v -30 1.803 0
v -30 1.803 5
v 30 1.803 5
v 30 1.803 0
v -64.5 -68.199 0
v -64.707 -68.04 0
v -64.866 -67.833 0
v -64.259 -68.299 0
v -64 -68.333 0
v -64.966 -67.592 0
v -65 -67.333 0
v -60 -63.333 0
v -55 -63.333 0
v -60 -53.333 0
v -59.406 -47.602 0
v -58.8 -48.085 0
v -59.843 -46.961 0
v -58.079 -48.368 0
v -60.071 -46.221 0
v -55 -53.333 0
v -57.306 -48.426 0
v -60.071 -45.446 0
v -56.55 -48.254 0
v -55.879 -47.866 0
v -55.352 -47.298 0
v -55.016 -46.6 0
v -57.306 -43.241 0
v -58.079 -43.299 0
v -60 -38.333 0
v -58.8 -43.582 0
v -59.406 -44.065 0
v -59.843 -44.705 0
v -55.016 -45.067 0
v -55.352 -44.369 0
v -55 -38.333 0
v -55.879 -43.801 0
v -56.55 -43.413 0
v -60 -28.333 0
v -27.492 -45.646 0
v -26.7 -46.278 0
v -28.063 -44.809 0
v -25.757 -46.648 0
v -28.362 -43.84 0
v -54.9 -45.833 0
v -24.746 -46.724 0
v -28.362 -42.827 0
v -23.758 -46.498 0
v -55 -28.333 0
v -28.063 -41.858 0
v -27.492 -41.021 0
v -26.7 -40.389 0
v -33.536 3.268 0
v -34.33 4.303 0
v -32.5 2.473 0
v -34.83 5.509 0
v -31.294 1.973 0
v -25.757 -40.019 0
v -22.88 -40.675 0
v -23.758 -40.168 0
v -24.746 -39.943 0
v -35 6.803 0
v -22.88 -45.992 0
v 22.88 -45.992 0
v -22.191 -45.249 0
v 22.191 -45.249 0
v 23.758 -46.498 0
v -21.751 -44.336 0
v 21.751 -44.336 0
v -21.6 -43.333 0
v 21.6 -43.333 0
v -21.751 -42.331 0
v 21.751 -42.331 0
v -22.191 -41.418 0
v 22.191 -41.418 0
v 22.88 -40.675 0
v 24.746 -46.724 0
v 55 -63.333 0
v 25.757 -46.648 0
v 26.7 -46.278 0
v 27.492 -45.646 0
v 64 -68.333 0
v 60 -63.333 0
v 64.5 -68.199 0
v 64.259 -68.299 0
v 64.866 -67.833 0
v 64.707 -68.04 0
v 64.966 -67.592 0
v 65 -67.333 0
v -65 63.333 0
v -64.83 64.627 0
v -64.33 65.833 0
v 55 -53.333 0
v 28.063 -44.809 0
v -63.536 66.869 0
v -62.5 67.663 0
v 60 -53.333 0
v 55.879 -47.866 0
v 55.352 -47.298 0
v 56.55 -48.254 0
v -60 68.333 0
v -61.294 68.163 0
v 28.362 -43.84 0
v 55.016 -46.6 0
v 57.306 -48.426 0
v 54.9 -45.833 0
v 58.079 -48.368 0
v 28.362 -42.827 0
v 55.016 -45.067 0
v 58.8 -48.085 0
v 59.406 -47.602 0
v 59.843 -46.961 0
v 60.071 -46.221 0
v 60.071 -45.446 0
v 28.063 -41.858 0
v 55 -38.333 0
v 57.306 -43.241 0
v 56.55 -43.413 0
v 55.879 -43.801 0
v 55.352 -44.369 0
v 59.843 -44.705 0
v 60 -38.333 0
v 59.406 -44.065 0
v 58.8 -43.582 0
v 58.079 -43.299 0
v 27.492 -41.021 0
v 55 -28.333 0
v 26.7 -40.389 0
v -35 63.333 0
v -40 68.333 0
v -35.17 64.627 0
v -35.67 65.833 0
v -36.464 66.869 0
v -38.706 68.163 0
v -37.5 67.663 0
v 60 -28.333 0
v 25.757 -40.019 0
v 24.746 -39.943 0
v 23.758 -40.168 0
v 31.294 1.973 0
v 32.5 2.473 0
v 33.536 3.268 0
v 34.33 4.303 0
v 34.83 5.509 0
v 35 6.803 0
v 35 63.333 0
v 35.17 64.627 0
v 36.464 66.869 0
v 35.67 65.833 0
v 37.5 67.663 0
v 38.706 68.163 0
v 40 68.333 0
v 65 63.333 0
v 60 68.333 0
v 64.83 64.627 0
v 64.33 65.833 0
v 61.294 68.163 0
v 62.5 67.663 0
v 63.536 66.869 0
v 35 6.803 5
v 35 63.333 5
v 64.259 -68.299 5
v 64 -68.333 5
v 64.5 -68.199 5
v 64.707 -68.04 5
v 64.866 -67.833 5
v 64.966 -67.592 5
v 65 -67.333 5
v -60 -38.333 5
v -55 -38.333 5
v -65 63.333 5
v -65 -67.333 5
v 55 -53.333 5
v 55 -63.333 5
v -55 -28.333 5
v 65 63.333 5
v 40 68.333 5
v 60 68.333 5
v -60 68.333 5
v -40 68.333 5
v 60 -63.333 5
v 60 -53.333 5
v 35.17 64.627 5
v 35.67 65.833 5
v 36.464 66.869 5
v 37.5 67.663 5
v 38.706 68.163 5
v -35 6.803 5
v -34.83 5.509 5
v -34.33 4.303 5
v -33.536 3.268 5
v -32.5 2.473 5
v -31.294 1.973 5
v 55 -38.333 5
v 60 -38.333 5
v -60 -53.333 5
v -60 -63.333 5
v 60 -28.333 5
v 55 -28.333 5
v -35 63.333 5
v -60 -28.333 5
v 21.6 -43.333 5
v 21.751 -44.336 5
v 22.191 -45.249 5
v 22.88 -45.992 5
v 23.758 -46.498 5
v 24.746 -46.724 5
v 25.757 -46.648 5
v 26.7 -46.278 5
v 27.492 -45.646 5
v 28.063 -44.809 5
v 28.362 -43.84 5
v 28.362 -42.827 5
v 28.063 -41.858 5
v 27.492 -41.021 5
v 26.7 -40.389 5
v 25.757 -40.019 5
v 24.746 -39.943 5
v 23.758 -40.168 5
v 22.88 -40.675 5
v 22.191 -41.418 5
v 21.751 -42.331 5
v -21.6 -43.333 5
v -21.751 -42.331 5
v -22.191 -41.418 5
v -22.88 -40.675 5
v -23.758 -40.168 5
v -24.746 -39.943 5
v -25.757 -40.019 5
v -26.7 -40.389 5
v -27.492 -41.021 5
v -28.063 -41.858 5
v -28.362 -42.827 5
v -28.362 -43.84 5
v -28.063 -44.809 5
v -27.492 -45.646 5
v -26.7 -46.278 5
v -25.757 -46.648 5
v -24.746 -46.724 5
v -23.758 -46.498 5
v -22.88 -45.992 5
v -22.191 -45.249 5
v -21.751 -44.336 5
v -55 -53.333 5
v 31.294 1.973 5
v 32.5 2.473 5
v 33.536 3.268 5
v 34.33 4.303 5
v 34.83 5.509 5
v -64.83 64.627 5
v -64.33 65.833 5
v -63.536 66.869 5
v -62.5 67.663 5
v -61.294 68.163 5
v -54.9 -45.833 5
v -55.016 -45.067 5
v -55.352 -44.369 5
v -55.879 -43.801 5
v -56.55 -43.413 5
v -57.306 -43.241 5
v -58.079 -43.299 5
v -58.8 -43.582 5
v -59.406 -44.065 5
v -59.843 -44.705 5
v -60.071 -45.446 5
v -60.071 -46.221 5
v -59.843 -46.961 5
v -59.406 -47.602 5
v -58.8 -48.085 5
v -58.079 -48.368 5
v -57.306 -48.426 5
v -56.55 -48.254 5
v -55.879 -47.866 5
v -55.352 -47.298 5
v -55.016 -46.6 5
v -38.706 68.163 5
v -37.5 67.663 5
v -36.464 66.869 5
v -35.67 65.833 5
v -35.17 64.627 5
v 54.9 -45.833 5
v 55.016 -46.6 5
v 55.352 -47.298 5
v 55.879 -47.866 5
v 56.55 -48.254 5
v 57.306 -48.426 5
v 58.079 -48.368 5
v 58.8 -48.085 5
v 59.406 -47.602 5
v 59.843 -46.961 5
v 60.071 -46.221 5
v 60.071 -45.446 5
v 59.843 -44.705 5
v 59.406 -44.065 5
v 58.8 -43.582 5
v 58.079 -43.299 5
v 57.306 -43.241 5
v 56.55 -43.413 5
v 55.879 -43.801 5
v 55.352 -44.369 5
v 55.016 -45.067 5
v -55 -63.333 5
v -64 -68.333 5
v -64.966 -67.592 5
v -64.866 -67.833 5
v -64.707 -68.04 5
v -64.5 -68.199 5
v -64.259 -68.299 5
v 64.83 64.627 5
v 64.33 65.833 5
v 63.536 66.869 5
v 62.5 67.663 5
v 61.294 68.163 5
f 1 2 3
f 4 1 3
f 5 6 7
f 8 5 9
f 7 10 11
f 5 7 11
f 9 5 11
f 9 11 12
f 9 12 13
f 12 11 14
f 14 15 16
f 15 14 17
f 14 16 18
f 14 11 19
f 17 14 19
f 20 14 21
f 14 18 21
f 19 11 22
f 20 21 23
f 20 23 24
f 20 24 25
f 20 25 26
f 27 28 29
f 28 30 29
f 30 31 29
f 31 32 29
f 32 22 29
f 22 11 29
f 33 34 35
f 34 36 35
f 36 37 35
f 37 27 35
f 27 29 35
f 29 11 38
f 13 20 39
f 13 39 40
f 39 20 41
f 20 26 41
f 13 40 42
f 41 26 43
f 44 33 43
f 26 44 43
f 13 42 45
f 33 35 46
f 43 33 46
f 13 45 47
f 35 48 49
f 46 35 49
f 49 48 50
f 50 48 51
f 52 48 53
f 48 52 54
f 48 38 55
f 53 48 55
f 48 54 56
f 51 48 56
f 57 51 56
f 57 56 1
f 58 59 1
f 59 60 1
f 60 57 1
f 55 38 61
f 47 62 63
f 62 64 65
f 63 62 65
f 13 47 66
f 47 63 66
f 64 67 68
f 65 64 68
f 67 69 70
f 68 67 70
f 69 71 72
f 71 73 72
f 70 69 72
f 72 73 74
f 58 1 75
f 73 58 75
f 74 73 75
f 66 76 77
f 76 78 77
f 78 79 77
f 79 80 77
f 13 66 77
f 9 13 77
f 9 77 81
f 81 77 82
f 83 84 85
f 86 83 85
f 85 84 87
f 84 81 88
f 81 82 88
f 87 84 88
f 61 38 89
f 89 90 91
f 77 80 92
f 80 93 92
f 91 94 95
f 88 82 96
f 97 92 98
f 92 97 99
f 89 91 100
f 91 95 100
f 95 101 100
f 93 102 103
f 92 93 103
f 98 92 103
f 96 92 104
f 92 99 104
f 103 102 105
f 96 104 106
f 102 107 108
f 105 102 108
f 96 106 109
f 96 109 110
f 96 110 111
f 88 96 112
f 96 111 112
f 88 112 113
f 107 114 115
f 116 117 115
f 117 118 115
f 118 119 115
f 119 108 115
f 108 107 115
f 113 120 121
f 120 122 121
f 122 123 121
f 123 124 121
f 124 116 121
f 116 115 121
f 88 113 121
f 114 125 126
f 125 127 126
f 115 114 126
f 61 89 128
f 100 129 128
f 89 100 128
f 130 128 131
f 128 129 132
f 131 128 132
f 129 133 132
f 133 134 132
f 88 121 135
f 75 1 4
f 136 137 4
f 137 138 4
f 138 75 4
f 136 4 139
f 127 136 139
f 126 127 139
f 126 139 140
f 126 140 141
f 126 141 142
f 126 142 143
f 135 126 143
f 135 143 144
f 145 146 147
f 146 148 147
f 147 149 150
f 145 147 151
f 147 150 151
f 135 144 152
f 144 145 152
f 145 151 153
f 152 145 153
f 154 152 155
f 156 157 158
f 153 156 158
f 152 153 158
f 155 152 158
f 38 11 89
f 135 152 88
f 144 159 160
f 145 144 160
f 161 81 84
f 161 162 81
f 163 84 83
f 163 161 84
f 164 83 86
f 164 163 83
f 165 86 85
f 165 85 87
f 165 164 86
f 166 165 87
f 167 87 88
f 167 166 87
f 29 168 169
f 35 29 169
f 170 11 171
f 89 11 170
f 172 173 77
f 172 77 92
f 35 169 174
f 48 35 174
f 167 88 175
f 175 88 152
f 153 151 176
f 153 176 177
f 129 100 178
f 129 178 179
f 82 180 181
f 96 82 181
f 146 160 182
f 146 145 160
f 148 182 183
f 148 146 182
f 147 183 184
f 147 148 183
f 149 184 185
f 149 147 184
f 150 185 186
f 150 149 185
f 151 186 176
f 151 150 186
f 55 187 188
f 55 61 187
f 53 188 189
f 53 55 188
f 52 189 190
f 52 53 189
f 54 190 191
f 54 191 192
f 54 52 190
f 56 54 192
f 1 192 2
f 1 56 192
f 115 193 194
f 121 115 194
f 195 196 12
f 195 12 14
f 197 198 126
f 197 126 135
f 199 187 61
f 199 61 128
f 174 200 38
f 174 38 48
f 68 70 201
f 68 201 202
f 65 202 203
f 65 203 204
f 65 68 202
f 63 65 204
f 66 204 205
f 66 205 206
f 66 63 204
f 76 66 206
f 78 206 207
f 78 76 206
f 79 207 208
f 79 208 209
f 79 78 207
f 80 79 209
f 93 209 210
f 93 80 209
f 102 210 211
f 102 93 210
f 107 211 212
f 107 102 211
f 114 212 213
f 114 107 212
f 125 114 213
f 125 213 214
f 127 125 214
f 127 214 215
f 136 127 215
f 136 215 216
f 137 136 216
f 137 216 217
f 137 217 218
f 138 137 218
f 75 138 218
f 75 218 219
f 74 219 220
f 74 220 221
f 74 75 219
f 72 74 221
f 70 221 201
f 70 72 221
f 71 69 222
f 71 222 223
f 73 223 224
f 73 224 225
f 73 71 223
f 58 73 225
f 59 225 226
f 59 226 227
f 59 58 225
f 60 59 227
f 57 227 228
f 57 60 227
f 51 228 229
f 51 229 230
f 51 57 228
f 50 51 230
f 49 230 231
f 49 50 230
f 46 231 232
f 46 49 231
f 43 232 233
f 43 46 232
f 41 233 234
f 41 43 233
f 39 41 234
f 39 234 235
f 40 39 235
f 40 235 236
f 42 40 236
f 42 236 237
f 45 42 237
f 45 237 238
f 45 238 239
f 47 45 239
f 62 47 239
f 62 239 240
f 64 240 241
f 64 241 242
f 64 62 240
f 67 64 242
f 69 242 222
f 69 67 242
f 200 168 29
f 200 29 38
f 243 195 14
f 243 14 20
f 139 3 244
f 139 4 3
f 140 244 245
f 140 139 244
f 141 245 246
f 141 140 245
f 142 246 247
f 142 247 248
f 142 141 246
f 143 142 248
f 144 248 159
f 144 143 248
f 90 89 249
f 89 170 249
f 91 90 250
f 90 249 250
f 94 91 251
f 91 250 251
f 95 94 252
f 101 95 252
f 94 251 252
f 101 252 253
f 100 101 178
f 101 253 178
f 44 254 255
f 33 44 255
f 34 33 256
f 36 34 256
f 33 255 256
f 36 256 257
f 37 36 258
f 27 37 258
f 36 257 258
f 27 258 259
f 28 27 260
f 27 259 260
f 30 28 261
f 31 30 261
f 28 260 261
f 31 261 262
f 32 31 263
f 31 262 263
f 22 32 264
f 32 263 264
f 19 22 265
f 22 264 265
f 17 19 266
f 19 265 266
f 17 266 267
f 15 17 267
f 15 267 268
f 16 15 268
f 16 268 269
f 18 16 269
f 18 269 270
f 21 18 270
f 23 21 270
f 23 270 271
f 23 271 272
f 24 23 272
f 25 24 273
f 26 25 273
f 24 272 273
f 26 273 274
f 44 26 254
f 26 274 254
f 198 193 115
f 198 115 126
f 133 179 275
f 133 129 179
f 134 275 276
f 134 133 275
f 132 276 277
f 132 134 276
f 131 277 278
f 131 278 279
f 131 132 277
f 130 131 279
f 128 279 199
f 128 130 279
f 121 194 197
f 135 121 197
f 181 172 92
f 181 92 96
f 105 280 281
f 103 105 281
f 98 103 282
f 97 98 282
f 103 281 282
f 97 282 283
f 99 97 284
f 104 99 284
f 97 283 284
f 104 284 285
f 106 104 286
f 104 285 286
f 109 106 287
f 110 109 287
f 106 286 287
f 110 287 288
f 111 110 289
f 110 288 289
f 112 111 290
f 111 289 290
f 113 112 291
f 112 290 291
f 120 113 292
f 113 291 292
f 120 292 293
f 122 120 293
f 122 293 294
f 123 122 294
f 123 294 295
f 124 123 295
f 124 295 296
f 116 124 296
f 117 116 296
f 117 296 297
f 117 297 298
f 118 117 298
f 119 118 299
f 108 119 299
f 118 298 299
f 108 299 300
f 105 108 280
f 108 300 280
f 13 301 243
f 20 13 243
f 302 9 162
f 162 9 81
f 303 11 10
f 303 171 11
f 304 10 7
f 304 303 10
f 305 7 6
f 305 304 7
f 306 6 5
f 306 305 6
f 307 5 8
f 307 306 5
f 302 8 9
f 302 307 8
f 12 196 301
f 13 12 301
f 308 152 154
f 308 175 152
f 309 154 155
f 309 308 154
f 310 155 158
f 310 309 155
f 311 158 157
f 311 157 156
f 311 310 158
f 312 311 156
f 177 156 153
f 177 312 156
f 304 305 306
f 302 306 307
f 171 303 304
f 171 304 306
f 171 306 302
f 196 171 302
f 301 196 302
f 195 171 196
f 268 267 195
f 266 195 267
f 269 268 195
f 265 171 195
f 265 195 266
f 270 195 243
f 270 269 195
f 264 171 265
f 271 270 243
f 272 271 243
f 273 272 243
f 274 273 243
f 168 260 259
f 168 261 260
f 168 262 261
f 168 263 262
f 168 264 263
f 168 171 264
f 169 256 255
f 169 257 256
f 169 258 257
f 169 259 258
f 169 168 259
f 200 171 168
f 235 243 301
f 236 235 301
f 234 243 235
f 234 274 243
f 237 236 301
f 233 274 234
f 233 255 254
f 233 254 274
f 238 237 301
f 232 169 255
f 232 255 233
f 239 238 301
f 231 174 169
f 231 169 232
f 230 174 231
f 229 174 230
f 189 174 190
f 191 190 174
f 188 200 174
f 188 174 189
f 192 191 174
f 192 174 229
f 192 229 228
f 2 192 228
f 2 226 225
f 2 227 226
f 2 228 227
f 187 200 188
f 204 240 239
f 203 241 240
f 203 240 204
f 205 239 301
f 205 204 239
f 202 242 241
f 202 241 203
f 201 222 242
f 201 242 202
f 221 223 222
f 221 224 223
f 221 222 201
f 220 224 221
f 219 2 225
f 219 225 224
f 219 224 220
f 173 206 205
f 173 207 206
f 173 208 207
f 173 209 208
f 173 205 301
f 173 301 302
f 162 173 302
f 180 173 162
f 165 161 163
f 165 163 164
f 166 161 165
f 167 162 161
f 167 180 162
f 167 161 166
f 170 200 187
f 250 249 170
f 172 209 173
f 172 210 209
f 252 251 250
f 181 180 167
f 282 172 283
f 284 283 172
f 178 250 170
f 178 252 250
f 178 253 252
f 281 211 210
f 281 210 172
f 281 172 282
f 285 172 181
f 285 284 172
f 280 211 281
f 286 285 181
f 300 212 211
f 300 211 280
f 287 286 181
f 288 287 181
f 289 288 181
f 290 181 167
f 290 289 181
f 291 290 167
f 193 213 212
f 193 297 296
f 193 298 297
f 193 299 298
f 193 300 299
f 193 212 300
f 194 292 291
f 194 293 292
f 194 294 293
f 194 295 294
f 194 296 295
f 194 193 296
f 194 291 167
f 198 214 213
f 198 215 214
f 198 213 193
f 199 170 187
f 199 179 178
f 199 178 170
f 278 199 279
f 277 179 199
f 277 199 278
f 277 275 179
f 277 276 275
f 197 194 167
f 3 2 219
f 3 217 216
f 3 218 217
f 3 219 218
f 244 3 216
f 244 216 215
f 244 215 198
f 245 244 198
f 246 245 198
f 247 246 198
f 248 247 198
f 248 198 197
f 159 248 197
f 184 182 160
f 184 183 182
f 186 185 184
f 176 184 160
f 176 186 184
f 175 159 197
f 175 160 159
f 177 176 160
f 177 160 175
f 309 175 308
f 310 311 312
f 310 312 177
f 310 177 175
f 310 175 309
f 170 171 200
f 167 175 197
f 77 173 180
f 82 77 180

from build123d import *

# Parameters (mm, degrees)
SKETCH1_W           = 130
SKETCH1_H           = 136.666666666
SKETCH1_R           = 3.4
BOSS_EXTRUDE1_DEPTH = 5
SKETCH2_R           = 2.6
SKETCH2_W           = 70
SKETCH2_H           = 110.094716781
SKETCH2_W_2         = 5
SKETCH2_H_2         = 10
CUT_EXTRUDE1_DEPTH  = 5
FILLET1_R           = 5
FILLET2_R           = 1


with BuildPart() as part:
    # Sketch1 → Boss-Extrude1 (new body)
    with BuildSketch(Plane.XY):
        Rectangle(SKETCH1_W, SKETCH1_H)
        with Locations((-25, -43.333333333)):
            Circle(SKETCH1_R, mode=Mode.SUBTRACT)
        with Locations(Location((25, -43.333333333, 0), (0, 0, 180))):
            Circle(SKETCH1_R, mode=Mode.SUBTRACT)
    extrude(amount=BOSS_EXTRUDE1_DEPTH)

    # Sketch2 → Cut-Extrude1 (cut)
    with BuildSketch(Plane.XY.offset(5)):
        with Locations((-57.5, -45.833333333)):
            Circle(SKETCH2_R)
        with Locations(Location((57.5, -45.833333333, 0), (0, 0, 180))):
            Circle(SKETCH2_R)
        with Locations((0, 56.850465305)):
            Rectangle(SKETCH2_W, SKETCH2_H)
        with Locations((-57.5, -33.333333333)):
            Rectangle(SKETCH2_W_2, SKETCH2_H_2)
        with Locations((-57.5, -58.333333333)):
            Rectangle(SKETCH2_W_2, SKETCH2_H_2)
        with Locations((57.5, -33.333333333)):
            Rectangle(SKETCH2_W_2, SKETCH2_H_2)
        with Locations((57.5, -58.333333333)):
            Rectangle(SKETCH2_W_2, SKETCH2_H_2)
    extrude(amount=-CUT_EXTRUDE1_DEPTH, mode=Mode.SUBTRACT)

    # Fillet1
    fillet1_edges = [part.edges().sort_by_distance(p)[0] for p in [
        (35, 68.333333333, 2.5),
        (-35, 68.333333333, 2.5),
        (-35, 1.803106914, 2.5),
        (35, 1.803106914, 2.5),
        (-65, 68.333333333, 2.5),
        (65, 68.333333333, 2.5),
    ]]
    fillet(fillet1_edges, radius=FILLET1_R)

    # Fillet2
    fillet2_edges = [part.edges().sort_by_distance(p)[0] for p in [
        (65, -68.333333333, 2.5),
        (-65, -68.333333333, 2.5),
    ]]
    fillet(fillet2_edges, radius=FILLET2_R)


solid = part.part
